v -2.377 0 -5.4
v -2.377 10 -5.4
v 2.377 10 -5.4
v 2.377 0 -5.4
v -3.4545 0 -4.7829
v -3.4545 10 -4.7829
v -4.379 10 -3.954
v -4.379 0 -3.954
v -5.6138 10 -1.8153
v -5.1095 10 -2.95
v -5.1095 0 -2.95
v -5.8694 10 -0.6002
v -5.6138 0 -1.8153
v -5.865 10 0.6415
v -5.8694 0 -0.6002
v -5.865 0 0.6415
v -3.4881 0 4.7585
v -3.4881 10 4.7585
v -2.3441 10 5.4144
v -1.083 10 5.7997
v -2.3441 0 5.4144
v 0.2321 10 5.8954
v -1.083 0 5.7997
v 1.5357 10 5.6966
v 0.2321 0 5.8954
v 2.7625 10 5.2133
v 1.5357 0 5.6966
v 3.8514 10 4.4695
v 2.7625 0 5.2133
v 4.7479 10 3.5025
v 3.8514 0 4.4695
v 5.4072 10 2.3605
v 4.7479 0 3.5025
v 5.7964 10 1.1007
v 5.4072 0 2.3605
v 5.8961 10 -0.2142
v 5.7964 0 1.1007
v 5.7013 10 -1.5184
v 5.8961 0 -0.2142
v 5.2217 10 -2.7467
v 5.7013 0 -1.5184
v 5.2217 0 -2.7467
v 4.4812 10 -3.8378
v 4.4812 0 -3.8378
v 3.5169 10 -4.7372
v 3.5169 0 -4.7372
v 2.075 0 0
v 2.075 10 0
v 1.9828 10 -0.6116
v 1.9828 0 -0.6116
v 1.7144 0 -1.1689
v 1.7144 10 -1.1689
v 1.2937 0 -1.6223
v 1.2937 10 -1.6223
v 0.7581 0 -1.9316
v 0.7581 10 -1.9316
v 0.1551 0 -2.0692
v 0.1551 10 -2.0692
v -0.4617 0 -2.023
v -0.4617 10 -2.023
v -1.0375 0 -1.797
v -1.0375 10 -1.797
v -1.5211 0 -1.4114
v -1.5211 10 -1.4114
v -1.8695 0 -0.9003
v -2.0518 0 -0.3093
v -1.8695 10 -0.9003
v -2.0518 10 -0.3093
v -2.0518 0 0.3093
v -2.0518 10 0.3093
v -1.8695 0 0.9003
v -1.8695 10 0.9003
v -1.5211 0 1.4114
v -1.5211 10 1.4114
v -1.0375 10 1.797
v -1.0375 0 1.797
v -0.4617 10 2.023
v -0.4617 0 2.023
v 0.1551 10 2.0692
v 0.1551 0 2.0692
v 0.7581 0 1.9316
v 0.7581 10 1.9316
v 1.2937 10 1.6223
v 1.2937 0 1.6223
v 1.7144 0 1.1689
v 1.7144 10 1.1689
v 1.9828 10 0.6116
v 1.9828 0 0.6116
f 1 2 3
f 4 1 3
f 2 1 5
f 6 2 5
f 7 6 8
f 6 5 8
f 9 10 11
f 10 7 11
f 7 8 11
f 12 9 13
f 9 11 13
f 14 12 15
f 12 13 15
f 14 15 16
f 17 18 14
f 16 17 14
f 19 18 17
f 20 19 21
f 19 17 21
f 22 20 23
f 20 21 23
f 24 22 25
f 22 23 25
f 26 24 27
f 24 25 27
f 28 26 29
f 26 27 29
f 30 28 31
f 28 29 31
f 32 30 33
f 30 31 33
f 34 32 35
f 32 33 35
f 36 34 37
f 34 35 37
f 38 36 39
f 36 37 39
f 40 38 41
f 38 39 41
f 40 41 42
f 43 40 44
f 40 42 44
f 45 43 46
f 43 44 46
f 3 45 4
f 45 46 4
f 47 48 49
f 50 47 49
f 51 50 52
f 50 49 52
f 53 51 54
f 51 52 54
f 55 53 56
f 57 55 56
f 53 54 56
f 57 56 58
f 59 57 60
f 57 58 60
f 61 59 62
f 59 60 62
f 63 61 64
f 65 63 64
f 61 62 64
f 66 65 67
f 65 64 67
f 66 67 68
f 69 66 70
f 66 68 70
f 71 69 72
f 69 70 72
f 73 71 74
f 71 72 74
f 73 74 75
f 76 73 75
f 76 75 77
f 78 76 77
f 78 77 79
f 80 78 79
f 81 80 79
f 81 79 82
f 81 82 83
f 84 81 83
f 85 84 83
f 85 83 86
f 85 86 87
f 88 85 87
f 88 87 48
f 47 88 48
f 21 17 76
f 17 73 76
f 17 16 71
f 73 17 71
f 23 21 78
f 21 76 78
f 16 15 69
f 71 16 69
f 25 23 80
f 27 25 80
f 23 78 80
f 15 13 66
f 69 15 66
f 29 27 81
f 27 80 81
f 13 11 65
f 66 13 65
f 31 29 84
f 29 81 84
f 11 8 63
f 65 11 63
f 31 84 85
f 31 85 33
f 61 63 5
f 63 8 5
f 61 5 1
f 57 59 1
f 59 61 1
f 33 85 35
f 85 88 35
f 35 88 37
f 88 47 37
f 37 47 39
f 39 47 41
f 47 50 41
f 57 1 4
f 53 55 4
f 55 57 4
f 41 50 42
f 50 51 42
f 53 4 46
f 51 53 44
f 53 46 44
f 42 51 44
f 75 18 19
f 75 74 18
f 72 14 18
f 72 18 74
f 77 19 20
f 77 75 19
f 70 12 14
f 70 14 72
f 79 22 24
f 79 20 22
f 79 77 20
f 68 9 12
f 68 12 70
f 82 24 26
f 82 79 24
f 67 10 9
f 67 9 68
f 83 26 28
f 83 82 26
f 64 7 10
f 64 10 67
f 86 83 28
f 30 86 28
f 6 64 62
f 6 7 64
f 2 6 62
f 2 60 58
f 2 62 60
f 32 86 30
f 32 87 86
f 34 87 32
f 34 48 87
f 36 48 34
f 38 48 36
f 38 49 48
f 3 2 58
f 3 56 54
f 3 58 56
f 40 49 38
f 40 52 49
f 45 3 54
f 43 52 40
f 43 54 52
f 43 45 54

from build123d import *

# Parameters (mm, degrees)
SKETCH2_R           = 5.9
BOSS_EXTRUDE1_DEPTH = 10
SKETCH3_R           = 2.075
CUT_EXTRUDE1_DEPTH  = 11
SKETCH4_W           = 11.8
SKETCH4_H           = 1
CUT_EXTRUDE2_DEPTH  = 11
CIRPATTERN1_COUNT   = 2
CIRPATTERN1_ANGLE   = 120


with BuildPart() as part:
    # Sketch2 → Boss-Extrude1 (new body)
    with BuildSketch(Plane(origin=(0, 0, 0), x_dir=(1, 0, 0), z_dir=(0, 1, 0))):
        Circle(SKETCH2_R)
    extrude(amount=BOSS_EXTRUDE1_DEPTH)

    # Sketch3 → Cut-Extrude1 (cut, through all)
    with BuildSketch(Plane(origin=(0, 10, 0), x_dir=(1, 0, 0), z_dir=(0, 1, 0))):
        Circle(SKETCH3_R)
    extrude(amount=-CUT_EXTRUDE1_DEPTH, mode=Mode.SUBTRACT)

    # Sketch4 → Cut-Extrude2 (cut, through all)
    with BuildSketch(Plane(origin=(0, 10, 0), x_dir=(1, 0, 0), z_dir=(0, 1, 0))):
        with Locations((0, 5.9)):
            Rectangle(SKETCH4_W, SKETCH4_H)
    cut_extrude2 = extrude(amount=-CUT_EXTRUDE2_DEPTH, mode=Mode.SUBTRACT)

    # CirPattern1: Cut-Extrude2 ×2 about axis
    cirpattern1_axis = Axis((0, 10, 0), (0, 1, 0))
    for i in range(1, CIRPATTERN1_COUNT):
        add(cut_extrude2.rotate(cirpattern1_axis, i * CIRPATTERN1_ANGLE / (CIRPATTERN1_COUNT - 1)), mode=Mode.SUBTRACT)


solid = part.part
